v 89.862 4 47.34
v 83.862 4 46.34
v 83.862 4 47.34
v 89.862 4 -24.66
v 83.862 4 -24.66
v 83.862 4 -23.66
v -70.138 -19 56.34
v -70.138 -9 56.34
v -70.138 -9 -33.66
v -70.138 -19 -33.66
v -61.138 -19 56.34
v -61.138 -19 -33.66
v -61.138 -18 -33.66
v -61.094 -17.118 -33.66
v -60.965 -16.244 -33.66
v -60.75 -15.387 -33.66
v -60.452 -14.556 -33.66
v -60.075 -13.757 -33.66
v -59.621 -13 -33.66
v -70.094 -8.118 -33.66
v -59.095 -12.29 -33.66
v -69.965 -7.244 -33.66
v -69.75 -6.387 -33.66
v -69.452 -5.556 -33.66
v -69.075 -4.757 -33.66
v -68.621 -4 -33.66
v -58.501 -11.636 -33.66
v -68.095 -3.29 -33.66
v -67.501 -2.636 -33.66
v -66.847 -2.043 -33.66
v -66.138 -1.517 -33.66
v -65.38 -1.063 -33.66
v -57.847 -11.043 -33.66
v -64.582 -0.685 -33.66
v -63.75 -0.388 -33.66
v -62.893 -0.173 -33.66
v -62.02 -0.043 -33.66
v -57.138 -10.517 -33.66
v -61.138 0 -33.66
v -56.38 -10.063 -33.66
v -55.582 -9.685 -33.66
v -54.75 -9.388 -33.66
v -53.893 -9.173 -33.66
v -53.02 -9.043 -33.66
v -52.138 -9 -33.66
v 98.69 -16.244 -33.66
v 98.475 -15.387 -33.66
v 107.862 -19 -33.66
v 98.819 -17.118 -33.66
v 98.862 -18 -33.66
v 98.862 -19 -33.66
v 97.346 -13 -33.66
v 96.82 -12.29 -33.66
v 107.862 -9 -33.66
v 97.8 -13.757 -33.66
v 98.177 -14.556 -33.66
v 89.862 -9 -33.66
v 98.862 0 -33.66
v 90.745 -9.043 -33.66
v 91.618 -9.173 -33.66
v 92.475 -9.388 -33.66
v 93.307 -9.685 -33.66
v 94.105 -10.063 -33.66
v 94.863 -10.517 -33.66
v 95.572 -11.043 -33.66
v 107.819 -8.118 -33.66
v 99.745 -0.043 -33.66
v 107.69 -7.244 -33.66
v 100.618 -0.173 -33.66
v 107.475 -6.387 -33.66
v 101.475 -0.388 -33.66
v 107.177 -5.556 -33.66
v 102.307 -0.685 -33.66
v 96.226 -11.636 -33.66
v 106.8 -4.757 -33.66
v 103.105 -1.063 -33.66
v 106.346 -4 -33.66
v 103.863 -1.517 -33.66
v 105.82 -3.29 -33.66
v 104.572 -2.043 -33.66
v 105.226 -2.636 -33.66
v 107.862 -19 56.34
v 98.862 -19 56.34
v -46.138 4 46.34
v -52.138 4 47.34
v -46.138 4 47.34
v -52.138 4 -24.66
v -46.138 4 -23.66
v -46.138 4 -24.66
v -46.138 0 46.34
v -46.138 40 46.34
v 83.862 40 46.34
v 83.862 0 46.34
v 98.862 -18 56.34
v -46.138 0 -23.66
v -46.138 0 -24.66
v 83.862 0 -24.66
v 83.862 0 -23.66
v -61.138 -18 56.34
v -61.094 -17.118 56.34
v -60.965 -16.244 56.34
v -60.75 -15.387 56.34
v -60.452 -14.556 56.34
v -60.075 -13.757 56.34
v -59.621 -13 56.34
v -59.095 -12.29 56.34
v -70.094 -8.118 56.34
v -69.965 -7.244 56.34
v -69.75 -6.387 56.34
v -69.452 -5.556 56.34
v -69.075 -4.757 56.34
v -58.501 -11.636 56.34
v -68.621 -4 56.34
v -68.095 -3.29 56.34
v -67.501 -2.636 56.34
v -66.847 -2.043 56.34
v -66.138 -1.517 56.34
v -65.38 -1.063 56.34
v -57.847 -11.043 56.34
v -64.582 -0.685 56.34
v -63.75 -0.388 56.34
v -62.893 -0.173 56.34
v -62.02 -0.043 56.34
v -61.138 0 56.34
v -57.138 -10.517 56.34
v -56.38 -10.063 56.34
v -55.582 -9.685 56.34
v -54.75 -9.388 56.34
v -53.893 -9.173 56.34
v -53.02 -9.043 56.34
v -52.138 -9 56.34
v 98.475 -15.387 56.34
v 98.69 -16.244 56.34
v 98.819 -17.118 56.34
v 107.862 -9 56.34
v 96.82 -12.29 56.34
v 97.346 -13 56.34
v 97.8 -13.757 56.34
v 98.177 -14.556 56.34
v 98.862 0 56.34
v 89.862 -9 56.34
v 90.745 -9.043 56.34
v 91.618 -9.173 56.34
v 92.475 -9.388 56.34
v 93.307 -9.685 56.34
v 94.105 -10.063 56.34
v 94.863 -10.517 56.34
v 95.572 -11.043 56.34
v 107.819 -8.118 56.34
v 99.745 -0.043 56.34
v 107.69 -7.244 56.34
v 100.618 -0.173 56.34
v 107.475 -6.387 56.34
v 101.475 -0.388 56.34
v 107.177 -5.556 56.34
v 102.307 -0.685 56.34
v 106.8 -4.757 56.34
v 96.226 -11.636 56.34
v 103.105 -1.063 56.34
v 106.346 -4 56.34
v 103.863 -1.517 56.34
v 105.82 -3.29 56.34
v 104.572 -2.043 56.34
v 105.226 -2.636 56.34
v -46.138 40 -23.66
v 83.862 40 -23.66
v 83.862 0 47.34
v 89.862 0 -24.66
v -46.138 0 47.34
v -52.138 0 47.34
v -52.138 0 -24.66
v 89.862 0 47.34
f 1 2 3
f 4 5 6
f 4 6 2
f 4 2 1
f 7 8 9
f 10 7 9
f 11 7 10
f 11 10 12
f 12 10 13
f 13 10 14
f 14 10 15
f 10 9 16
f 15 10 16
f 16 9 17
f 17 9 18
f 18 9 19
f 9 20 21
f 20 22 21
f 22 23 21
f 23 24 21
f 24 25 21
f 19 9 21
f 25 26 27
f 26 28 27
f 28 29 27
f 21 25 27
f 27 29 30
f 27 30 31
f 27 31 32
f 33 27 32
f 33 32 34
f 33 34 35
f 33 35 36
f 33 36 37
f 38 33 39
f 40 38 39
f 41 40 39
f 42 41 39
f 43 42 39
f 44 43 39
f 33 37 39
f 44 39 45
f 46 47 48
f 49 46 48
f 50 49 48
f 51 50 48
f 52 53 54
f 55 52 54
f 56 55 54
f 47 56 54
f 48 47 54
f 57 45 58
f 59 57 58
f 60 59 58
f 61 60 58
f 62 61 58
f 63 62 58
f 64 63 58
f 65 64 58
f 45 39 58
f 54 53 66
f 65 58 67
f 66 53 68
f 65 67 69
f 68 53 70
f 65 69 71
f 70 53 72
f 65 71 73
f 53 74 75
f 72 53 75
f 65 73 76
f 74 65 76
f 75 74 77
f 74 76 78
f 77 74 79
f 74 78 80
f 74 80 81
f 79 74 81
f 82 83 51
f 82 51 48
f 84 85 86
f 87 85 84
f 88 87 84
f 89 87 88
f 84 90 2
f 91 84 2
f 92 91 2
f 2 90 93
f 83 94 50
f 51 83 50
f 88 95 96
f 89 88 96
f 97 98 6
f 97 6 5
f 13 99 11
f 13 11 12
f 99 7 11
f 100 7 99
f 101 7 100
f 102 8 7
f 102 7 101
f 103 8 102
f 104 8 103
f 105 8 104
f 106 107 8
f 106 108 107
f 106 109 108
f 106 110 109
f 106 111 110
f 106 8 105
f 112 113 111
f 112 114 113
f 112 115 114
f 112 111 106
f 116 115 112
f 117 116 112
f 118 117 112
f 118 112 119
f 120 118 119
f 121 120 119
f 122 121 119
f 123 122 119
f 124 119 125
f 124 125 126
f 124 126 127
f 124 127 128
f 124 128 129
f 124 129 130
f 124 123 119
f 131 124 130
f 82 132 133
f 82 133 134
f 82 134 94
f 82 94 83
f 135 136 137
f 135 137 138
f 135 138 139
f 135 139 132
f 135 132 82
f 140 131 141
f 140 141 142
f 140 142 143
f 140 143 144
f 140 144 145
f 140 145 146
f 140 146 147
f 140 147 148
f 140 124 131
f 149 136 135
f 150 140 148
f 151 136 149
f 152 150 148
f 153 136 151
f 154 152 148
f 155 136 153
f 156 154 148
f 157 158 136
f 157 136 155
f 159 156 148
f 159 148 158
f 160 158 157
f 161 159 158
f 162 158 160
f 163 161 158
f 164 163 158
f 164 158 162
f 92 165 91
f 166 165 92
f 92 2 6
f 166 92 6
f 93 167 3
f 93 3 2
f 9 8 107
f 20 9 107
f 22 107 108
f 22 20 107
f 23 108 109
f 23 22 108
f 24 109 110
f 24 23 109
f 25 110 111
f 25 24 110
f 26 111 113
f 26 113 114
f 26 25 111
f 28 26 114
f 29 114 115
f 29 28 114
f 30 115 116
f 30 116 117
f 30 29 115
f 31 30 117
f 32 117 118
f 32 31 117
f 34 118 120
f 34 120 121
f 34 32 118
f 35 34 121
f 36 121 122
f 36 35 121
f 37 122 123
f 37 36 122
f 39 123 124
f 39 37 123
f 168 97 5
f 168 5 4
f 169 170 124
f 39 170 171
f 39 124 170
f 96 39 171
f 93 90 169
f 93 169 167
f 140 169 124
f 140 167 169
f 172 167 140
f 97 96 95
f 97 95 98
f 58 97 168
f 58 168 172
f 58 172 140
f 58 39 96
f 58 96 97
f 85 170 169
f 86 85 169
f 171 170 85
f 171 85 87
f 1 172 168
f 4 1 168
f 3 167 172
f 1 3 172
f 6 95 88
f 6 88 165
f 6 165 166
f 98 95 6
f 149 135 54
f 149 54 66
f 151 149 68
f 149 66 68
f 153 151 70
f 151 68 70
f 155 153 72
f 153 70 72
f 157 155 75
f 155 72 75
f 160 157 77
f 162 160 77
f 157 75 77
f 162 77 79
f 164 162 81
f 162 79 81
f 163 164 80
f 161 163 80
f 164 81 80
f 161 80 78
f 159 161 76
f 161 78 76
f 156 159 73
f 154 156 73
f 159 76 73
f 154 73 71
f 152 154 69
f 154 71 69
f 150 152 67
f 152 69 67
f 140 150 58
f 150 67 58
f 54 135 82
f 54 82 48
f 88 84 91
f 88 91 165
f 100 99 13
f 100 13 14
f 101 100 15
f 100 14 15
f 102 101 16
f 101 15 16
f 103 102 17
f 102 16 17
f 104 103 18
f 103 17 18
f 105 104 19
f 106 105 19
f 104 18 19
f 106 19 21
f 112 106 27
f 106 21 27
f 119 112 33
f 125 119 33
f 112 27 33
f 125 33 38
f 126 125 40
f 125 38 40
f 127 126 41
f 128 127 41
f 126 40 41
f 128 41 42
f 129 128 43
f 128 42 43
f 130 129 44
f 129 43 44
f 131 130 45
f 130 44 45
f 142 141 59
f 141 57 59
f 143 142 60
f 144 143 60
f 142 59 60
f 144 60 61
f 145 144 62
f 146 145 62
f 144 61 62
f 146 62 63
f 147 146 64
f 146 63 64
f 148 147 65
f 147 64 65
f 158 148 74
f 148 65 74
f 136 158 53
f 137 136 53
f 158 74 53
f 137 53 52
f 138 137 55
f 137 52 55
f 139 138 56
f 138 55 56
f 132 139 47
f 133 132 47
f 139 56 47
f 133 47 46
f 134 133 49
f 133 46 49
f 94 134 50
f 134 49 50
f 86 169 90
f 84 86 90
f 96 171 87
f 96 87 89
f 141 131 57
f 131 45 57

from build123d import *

# Parameters (mm, degrees)
ESQUISSE2_W              = 160
ESQUISSE2_H              = 90
EXTRUSION1_DEPTH         = 9
ESQUISSE1_W              = 130
ESQUISSE1_H              = 70
BEURRE_AVEC_MARGES_DEPTH = 40
ESQUISSE4_W              = 6
ESQUISSE4_H              = 72
EXTRUSION3_DEPTH         = 4
ESQUISSE6_W              = 9
ESQUISSE6_H              = 90
EXTRUSION4_DEPTH         = 19
CONG_1_R                 = 9


with BuildPart() as part:
    # Esquisse2 → Extrusion1 (new body)
    with BuildSketch(Plane(origin=(0, 0, 0), x_dir=(1, 0, 0), z_dir=(0, 1, 0))):
        with Locations((18.862465753, -11.339726027)):
            Rectangle(ESQUISSE2_W, ESQUISSE2_H)
    extrude(amount=-EXTRUSION1_DEPTH)

    # Esquisse1 → Beurre (avec marges) (add)
    with BuildSketch(Plane(origin=(0, 0, 0), x_dir=(1, 0, 0), z_dir=(0, 1, 0))):
        with Locations((18.862465753, -11.339726027)):
            Rectangle(ESQUISSE1_W, ESQUISSE1_H)
    extrude(amount=BEURRE_AVEC_MARGES_DEPTH)

    # Esquisse4 → Extrusion3 (add)
    with BuildSketch(Plane(origin=(0, 0, 0), x_dir=(1, 0, 0), z_dir=(0, 1, 0))):
        with Locations((-49.137534247, -11.339726027)):
            Rectangle(ESQUISSE4_W, ESQUISSE4_H)
        with Locations((86.862465753, -11.339726027)):
            Rectangle(ESQUISSE4_W, ESQUISSE4_H)
    extrude(amount=EXTRUSION3_DEPTH)

    # Esquisse6 → Extrusion4 (add)
    with BuildSketch(Plane(origin=(0, 0, 0), x_dir=(1, 0, 0), z_dir=(0, 1, 0))):
        with Locations((-65.637534247, -11.339726027)):
            Rectangle(ESQUISSE6_W, ESQUISSE6_H)
        with Locations((103.362465753, -11.339726027)):
            Rectangle(ESQUISSE6_W, ESQUISSE6_H)
    extrude(amount=-EXTRUSION4_DEPTH)

    # Congé1
    cong_1_edges = [part.edges().sort_by_distance(p)[0] for p in [
        (98.862465753, -9, 11.339726027),
        (-61.137534247, -9, 11.339726027),
        (107.862465753, 0, 11.339726027),
        (-70.137534247, 0, 11.339726027),
    ]]
    fillet(cong_1_edges, radius=CONG_1_R)


solid = part.part
